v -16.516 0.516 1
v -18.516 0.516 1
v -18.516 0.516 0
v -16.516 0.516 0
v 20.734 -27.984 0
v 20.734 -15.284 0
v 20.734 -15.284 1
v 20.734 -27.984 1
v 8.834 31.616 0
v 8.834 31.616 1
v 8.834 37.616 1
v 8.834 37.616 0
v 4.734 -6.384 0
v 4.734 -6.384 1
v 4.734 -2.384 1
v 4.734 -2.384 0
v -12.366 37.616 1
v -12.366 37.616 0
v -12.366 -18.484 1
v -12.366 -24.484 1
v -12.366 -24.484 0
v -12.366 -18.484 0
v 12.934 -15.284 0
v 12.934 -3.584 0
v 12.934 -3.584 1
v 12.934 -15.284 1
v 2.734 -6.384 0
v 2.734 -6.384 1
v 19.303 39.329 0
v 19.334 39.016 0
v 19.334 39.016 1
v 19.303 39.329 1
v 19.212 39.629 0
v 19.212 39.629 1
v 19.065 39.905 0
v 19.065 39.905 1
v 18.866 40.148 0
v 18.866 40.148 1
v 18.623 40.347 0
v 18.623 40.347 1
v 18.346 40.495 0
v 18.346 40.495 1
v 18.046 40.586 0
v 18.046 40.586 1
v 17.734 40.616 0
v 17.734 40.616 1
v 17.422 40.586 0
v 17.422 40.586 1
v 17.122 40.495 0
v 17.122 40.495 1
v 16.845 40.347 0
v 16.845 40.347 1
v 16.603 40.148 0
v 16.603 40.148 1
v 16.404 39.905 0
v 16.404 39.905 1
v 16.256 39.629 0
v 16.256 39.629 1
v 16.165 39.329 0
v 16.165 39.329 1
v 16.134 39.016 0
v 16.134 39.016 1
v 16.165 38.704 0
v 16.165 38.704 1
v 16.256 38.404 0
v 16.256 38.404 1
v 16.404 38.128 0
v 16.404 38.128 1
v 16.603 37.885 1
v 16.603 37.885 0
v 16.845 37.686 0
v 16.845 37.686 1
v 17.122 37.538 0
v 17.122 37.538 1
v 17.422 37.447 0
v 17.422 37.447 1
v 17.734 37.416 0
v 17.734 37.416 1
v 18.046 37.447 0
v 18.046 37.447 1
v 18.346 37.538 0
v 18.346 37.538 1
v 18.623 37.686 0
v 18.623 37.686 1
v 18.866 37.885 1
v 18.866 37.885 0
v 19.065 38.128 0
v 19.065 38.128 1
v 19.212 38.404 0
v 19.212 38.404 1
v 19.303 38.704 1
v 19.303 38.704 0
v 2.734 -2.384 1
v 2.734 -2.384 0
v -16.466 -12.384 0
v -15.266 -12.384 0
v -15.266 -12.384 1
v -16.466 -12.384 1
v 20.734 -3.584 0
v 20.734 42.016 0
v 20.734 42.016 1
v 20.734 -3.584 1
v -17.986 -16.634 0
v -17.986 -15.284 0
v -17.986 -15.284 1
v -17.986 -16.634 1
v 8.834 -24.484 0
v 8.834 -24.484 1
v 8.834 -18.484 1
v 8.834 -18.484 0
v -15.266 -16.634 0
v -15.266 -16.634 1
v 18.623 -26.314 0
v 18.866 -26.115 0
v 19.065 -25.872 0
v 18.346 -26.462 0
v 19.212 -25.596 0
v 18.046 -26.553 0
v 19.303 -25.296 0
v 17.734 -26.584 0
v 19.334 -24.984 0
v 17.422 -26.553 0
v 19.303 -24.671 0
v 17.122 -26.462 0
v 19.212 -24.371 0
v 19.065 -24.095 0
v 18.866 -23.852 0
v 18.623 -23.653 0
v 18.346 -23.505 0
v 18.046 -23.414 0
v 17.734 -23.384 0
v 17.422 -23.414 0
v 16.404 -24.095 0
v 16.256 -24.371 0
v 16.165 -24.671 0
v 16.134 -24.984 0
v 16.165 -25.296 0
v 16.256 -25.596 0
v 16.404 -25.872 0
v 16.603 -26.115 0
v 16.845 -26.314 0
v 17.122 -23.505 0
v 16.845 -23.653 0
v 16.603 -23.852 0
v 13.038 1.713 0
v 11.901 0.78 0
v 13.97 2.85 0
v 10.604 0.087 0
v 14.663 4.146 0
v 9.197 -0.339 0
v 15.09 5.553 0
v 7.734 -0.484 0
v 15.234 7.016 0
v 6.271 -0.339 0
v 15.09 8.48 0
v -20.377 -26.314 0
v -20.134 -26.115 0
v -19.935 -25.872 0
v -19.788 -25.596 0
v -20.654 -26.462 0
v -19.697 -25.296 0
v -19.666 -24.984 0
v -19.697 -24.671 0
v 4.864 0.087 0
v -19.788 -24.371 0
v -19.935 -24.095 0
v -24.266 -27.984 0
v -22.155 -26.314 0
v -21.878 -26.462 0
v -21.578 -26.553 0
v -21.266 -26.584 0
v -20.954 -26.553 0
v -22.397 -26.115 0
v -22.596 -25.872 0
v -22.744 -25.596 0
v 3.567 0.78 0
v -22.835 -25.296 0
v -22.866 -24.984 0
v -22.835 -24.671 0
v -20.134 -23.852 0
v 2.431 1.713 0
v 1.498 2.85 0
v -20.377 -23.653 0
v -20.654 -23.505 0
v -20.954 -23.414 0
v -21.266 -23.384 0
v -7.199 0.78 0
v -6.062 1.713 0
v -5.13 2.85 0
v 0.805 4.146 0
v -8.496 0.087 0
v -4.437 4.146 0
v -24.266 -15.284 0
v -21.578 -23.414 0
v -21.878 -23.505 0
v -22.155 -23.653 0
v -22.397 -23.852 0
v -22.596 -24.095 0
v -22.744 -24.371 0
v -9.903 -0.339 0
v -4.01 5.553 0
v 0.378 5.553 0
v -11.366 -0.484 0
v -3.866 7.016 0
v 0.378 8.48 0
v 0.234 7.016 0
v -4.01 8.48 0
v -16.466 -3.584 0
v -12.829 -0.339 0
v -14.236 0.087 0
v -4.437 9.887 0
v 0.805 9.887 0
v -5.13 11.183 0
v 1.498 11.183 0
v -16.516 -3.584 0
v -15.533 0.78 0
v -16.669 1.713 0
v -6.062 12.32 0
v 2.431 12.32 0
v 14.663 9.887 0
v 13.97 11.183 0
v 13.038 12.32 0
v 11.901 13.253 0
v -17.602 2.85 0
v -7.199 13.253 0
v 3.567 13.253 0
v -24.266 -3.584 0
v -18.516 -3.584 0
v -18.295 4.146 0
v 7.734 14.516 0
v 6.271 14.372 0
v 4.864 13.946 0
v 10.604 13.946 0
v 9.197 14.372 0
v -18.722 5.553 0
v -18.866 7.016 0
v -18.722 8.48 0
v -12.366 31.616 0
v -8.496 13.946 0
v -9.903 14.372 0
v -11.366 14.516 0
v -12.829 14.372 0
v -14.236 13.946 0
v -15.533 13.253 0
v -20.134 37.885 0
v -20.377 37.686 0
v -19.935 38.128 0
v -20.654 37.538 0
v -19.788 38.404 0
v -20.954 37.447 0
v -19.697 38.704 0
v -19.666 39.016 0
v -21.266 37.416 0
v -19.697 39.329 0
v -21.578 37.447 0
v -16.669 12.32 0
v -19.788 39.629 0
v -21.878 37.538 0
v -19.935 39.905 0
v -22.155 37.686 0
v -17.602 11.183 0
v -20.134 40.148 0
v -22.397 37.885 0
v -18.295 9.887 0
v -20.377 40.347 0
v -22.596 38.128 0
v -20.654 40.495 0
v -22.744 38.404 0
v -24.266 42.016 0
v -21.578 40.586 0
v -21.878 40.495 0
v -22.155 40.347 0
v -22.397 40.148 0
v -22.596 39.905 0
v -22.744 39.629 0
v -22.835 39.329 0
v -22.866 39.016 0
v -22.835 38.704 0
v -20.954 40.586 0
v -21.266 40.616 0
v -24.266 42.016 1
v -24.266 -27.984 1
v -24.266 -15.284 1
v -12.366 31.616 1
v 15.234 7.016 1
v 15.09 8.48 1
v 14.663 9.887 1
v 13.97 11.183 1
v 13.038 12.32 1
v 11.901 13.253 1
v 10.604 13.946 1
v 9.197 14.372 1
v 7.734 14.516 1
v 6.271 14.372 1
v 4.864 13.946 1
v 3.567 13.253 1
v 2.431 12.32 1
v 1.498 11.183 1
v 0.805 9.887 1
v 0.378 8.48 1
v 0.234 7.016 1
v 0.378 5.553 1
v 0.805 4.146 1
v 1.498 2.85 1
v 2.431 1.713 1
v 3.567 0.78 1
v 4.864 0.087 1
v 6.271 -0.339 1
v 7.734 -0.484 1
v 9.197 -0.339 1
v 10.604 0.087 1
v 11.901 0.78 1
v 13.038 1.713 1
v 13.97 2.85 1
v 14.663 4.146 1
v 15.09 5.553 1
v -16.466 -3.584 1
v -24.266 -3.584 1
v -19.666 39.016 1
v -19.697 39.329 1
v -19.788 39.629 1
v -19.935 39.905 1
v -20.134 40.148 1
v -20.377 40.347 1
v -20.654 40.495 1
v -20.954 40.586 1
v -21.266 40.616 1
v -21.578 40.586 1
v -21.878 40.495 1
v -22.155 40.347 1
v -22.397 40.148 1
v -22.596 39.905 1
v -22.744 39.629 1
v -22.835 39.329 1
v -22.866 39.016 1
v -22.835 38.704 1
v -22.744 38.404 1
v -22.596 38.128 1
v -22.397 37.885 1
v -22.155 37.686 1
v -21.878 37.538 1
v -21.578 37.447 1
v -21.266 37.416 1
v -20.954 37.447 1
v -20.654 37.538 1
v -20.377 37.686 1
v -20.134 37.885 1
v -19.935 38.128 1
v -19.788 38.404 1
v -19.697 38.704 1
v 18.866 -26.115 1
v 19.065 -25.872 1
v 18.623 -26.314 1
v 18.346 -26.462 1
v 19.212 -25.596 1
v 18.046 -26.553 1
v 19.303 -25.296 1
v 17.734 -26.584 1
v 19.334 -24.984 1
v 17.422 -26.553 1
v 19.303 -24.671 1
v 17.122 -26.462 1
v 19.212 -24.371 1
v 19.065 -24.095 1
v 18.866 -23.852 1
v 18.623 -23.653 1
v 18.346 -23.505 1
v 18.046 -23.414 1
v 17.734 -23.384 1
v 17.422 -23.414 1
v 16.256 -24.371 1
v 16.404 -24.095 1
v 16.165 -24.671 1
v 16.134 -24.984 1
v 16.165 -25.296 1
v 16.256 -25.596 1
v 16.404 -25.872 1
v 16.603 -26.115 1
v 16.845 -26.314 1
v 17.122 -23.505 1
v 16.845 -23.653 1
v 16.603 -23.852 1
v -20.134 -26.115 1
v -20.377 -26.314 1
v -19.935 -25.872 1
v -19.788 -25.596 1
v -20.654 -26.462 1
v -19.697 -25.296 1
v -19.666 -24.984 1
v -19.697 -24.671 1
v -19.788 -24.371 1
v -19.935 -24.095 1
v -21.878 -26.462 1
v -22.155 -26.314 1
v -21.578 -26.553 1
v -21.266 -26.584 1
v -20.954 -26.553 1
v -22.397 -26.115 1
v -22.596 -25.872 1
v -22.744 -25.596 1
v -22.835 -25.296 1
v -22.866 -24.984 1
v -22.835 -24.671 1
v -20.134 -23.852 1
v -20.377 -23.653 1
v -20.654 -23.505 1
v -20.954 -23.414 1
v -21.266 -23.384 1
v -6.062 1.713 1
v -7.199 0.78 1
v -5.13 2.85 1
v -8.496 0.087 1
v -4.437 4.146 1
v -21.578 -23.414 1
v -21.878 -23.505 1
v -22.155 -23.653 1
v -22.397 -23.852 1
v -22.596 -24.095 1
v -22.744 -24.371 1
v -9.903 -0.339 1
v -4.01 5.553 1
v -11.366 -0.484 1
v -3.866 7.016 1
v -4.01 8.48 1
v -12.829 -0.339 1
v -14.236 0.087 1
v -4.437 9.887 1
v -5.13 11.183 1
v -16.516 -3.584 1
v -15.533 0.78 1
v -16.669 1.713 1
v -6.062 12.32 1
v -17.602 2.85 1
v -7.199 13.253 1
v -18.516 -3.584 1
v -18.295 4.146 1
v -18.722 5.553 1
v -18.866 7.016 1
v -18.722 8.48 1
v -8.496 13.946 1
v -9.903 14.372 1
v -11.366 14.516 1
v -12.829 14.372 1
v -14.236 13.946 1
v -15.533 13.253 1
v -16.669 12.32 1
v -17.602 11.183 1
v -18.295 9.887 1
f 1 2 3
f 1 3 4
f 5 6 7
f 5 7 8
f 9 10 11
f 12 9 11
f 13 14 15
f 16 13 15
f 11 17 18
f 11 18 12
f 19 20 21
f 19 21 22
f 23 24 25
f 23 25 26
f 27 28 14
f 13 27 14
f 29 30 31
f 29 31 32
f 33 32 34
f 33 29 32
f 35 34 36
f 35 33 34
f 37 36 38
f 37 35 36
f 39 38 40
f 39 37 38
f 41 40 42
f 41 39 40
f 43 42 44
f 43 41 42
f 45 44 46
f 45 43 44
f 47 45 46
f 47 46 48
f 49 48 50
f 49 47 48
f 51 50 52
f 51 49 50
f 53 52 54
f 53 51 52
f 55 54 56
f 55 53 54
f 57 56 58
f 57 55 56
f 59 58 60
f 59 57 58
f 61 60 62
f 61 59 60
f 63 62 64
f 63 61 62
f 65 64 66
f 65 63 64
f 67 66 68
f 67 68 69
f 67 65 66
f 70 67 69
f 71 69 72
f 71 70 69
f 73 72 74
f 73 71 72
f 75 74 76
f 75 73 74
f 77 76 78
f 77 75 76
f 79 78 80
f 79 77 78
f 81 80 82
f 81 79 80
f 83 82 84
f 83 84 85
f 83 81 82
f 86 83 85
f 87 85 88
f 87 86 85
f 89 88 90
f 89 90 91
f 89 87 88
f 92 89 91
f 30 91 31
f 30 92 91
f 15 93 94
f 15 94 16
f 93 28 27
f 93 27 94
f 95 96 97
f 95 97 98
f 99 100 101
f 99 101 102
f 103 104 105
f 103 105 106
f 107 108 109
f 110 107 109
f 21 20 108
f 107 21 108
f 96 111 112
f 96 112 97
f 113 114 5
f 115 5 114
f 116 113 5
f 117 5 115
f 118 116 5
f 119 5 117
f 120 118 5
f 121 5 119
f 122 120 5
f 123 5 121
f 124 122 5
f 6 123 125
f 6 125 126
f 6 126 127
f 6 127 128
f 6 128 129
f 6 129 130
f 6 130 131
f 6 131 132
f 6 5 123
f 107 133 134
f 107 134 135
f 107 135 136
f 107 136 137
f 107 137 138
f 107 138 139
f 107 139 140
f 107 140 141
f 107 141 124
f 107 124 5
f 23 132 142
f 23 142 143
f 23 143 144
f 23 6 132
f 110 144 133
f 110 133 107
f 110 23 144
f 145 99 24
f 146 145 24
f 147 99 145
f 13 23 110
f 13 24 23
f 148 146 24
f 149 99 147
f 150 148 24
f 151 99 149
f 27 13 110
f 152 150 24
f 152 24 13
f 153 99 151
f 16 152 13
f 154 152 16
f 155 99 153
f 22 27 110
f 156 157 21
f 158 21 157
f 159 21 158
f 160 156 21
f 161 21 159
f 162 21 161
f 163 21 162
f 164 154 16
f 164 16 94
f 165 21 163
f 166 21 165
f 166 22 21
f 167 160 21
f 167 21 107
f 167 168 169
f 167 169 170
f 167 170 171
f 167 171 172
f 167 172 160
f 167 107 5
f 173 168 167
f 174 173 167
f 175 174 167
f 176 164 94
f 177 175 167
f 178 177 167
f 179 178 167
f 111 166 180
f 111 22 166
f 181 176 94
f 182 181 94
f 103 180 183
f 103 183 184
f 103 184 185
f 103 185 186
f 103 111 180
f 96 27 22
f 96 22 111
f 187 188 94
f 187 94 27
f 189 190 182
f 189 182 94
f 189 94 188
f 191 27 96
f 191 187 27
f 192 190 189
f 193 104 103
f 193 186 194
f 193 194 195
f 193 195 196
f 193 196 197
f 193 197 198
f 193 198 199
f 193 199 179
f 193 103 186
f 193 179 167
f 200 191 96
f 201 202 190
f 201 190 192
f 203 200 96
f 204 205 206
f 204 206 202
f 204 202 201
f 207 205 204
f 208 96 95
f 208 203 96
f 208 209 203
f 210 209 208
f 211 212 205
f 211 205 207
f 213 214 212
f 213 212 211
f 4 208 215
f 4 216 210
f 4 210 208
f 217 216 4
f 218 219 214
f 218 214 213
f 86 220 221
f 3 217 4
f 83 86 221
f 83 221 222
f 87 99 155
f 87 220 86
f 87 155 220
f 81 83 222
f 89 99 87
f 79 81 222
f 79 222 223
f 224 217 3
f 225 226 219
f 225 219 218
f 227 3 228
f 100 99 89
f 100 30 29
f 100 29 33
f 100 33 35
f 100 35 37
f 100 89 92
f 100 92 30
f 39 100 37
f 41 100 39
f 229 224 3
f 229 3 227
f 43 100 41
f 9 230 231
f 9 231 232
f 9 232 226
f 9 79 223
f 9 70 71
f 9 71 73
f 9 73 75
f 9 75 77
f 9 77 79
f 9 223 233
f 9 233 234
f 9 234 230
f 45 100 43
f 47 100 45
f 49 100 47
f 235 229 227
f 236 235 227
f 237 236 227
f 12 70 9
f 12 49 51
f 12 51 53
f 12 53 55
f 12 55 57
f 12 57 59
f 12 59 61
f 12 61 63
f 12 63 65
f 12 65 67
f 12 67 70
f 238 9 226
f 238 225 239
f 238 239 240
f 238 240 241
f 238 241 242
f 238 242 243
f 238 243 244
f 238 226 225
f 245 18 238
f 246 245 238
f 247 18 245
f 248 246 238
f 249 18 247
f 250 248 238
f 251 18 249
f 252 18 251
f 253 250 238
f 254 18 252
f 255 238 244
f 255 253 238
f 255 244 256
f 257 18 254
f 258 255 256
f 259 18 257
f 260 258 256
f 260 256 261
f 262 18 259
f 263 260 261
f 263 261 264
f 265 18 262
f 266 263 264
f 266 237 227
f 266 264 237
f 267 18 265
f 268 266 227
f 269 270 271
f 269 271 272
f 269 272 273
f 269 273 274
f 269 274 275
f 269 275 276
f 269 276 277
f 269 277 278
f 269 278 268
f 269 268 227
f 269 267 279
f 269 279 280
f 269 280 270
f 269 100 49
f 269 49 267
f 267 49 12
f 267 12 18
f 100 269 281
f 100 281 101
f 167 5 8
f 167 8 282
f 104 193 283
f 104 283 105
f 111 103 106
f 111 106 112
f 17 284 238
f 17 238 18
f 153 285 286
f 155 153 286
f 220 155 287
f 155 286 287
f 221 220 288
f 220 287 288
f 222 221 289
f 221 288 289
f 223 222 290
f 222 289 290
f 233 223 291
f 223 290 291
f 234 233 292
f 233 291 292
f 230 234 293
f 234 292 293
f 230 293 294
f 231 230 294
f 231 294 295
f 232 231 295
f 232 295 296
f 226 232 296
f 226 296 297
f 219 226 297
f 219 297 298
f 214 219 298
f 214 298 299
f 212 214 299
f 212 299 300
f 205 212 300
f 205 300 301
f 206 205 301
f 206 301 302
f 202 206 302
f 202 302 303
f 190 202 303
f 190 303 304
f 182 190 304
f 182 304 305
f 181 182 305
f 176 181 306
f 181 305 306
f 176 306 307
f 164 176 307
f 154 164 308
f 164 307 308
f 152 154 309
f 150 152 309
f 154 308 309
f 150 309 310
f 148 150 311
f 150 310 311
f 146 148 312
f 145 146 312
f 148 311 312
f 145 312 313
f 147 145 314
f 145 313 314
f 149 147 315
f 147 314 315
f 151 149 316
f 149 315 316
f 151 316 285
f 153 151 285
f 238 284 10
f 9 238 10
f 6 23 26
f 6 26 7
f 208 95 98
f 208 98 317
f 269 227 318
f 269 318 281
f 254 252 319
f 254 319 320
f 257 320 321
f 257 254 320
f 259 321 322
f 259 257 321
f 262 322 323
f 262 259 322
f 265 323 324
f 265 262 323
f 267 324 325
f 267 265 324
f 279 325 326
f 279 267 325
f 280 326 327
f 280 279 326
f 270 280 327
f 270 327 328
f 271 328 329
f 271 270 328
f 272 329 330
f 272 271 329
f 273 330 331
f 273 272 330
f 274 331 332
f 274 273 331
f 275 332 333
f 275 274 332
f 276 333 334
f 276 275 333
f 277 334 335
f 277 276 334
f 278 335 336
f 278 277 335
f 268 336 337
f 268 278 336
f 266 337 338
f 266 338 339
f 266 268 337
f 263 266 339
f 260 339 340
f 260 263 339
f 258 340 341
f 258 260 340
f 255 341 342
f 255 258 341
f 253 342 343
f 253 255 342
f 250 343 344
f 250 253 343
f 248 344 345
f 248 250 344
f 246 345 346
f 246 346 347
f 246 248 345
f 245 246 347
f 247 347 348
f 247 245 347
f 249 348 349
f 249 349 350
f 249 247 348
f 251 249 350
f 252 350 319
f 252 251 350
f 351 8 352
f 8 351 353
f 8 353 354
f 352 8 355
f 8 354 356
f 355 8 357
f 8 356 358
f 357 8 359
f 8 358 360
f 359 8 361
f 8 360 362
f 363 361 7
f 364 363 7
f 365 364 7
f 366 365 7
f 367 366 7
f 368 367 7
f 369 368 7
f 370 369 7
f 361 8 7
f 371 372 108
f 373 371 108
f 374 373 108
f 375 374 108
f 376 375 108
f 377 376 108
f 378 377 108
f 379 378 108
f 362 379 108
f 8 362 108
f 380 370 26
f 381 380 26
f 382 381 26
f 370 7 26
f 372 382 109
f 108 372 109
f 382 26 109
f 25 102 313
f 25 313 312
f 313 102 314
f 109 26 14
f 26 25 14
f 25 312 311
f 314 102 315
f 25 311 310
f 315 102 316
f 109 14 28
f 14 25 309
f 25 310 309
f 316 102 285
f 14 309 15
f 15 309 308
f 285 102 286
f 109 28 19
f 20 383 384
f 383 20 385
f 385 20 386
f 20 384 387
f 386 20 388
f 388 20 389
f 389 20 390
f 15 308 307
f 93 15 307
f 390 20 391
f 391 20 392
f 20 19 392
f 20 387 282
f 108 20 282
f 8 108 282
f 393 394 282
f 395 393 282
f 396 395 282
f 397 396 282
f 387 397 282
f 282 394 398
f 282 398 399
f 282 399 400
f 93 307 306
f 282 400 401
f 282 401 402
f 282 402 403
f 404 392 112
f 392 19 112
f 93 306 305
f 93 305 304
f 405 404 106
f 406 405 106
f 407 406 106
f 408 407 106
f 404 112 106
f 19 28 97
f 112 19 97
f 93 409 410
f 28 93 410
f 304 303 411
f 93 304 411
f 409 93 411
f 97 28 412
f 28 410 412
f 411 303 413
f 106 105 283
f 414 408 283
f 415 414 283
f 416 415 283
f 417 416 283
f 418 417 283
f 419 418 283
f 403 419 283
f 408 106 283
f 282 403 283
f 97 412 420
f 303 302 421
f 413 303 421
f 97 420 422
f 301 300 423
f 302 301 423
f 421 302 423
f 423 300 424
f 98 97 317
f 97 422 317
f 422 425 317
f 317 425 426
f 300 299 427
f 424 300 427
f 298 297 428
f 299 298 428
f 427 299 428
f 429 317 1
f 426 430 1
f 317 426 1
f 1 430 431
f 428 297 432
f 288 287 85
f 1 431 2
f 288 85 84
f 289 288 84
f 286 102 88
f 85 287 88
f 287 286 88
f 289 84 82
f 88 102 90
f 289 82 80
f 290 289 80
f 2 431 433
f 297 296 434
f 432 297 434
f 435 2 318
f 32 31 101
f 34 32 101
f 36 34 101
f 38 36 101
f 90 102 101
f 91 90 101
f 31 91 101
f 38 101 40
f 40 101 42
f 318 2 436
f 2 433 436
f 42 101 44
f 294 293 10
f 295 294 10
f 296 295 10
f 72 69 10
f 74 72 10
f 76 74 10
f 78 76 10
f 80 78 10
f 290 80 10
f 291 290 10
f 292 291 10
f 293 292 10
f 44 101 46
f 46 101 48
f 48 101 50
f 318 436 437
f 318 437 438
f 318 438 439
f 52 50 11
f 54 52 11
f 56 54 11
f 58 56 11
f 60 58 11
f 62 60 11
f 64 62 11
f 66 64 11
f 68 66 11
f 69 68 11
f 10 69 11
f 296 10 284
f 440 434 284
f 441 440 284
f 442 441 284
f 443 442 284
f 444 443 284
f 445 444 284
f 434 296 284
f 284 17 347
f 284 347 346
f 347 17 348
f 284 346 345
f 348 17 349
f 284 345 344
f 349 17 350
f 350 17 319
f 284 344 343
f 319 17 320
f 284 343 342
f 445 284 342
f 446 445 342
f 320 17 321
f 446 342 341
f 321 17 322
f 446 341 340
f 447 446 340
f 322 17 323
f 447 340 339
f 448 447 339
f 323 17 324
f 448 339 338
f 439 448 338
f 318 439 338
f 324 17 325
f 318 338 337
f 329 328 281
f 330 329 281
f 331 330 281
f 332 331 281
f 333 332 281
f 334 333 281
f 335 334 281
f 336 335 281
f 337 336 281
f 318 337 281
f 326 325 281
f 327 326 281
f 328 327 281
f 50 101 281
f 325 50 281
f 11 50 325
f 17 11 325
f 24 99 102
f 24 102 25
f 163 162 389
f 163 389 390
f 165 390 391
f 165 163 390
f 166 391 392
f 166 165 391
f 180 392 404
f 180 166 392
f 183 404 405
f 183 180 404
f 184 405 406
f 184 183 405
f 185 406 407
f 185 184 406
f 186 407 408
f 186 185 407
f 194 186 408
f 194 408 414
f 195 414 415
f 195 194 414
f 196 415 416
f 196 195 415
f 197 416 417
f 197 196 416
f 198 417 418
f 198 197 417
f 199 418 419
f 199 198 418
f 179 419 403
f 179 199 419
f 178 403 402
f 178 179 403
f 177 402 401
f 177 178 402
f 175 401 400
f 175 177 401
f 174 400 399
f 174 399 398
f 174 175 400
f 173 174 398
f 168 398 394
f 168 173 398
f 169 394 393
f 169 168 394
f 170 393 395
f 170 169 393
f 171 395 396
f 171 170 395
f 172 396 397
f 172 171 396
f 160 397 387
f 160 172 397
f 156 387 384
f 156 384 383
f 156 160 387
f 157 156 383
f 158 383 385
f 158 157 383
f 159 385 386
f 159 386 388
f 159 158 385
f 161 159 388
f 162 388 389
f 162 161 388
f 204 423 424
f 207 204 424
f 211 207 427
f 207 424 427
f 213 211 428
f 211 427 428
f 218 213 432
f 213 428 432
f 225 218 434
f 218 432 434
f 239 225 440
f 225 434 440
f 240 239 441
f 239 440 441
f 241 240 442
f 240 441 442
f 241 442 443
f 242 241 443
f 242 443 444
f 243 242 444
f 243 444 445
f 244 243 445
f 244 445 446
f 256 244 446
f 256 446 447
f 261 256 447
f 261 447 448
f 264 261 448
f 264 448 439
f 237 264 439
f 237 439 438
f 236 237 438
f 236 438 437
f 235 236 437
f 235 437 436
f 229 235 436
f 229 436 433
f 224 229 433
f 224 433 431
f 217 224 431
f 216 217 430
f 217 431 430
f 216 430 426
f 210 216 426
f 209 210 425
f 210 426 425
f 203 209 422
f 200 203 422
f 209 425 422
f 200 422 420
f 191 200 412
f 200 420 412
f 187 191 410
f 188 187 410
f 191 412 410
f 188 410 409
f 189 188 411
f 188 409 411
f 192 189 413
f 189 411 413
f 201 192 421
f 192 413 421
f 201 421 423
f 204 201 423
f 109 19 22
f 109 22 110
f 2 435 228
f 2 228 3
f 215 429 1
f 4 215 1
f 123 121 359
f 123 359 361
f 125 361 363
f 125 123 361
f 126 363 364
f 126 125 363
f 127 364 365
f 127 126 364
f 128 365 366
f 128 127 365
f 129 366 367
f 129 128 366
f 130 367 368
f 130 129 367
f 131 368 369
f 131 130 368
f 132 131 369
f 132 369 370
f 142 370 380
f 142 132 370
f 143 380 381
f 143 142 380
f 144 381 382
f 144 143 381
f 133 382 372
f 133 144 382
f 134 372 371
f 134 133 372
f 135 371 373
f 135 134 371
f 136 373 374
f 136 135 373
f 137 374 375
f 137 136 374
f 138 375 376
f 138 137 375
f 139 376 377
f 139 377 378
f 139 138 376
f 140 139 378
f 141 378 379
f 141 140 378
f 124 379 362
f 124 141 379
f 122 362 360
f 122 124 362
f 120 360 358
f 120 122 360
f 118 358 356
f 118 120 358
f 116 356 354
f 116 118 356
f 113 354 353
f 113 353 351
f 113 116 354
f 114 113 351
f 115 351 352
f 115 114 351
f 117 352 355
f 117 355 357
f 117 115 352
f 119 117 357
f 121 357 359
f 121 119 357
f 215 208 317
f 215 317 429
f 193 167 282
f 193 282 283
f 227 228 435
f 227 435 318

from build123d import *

# Parameters (mm, degrees)
SKETCH1_R           = 1.6
BOSS_EXTRUDE1_DEPTH = 1
SKETCH5_W           = 2
SKETCH5_H           = 4.5
SKETCH5_H_2         = 4
CUT_EXTRUDE1_DEPTH  = 4
SKETCH4_W           = 21.2
SKETCH4_H           = 6
CUT_EXTRUDE2_DEPTH  = 4
SKETCH2_R           = 7.5
CUT_EXTRUDE3_DEPTH  = 4


with BuildPart() as part:
    # Sketch1 → Boss-Extrude1 (new body)
    with BuildSketch(Plane.XY):
        Polygon((20.734205703, -15.283501687), (20.734205703, -27.983501687), (-24.265794297, -27.983501687), (-24.265794297, -15.283501687), (-17.985794297, -15.283501687), (-17.985794297, -16.633501687), (-15.265794297, -16.633501687), (-15.265794297, -12.383501687), (-16.465794297, -12.383501687), (-16.465794297, -3.583501687), (-24.265794297, -3.583501687), (-24.265794297, 42.016498313), (20.734205703, 42.016498313), (20.734205703, -3.583501687), (12.934205703, -3.583501687), (12.934205703, -15.283501687), align=None)
        with Locations((-21.265794297, 39.016498313)):
            Circle(SKETCH1_R, mode=Mode.SUBTRACT)
        with Locations((17.734205703, 39.016498313)):
            Circle(SKETCH1_R, mode=Mode.SUBTRACT)
        with Locations((-21.265794297, -24.983501687)):
            Circle(SKETCH1_R, mode=Mode.SUBTRACT)
        with Locations((17.734205703, -24.983501687)):
            Circle(SKETCH1_R, mode=Mode.SUBTRACT)
    extrude(amount=BOSS_EXTRUDE1_DEPTH)

    # Sketch5 → Cut-Extrude1 (cut)
    with BuildSketch(Plane.XY.offset(1)):
        with Locations((-17.515794297, -1.733501687)):
            Rectangle(SKETCH5_W, SKETCH5_H)
        with Locations((3.734205703, -4.383501687)):
            Rectangle(SKETCH5_W, SKETCH5_H_2)
    extrude(amount=-CUT_EXTRUDE1_DEPTH, mode=Mode.SUBTRACT)

    # Sketch4 → Cut-Extrude2 (cut)
    with BuildSketch(Plane.XY.offset(1)):
        with Locations((-1.765794297, -21.483501687)):
            Rectangle(SKETCH4_W, SKETCH4_H)
        with Locations((-1.765794297, 34.616498313)):
            Rectangle(SKETCH4_W, SKETCH4_H)
    extrude(amount=-CUT_EXTRUDE2_DEPTH, mode=Mode.SUBTRACT)

    # Sketch2 → Cut-Extrude3 (cut)
    with BuildSketch(Plane.XY.offset(1)):
        with Locations((-11.365794297, 7.016498313)):
            Circle(SKETCH2_R)
        with Locations((7.734205703, 7.016498313)):
            Circle(SKETCH2_R)
    extrude(amount=-CUT_EXTRUDE3_DEPTH, mode=Mode.SUBTRACT)


solid = part.part
